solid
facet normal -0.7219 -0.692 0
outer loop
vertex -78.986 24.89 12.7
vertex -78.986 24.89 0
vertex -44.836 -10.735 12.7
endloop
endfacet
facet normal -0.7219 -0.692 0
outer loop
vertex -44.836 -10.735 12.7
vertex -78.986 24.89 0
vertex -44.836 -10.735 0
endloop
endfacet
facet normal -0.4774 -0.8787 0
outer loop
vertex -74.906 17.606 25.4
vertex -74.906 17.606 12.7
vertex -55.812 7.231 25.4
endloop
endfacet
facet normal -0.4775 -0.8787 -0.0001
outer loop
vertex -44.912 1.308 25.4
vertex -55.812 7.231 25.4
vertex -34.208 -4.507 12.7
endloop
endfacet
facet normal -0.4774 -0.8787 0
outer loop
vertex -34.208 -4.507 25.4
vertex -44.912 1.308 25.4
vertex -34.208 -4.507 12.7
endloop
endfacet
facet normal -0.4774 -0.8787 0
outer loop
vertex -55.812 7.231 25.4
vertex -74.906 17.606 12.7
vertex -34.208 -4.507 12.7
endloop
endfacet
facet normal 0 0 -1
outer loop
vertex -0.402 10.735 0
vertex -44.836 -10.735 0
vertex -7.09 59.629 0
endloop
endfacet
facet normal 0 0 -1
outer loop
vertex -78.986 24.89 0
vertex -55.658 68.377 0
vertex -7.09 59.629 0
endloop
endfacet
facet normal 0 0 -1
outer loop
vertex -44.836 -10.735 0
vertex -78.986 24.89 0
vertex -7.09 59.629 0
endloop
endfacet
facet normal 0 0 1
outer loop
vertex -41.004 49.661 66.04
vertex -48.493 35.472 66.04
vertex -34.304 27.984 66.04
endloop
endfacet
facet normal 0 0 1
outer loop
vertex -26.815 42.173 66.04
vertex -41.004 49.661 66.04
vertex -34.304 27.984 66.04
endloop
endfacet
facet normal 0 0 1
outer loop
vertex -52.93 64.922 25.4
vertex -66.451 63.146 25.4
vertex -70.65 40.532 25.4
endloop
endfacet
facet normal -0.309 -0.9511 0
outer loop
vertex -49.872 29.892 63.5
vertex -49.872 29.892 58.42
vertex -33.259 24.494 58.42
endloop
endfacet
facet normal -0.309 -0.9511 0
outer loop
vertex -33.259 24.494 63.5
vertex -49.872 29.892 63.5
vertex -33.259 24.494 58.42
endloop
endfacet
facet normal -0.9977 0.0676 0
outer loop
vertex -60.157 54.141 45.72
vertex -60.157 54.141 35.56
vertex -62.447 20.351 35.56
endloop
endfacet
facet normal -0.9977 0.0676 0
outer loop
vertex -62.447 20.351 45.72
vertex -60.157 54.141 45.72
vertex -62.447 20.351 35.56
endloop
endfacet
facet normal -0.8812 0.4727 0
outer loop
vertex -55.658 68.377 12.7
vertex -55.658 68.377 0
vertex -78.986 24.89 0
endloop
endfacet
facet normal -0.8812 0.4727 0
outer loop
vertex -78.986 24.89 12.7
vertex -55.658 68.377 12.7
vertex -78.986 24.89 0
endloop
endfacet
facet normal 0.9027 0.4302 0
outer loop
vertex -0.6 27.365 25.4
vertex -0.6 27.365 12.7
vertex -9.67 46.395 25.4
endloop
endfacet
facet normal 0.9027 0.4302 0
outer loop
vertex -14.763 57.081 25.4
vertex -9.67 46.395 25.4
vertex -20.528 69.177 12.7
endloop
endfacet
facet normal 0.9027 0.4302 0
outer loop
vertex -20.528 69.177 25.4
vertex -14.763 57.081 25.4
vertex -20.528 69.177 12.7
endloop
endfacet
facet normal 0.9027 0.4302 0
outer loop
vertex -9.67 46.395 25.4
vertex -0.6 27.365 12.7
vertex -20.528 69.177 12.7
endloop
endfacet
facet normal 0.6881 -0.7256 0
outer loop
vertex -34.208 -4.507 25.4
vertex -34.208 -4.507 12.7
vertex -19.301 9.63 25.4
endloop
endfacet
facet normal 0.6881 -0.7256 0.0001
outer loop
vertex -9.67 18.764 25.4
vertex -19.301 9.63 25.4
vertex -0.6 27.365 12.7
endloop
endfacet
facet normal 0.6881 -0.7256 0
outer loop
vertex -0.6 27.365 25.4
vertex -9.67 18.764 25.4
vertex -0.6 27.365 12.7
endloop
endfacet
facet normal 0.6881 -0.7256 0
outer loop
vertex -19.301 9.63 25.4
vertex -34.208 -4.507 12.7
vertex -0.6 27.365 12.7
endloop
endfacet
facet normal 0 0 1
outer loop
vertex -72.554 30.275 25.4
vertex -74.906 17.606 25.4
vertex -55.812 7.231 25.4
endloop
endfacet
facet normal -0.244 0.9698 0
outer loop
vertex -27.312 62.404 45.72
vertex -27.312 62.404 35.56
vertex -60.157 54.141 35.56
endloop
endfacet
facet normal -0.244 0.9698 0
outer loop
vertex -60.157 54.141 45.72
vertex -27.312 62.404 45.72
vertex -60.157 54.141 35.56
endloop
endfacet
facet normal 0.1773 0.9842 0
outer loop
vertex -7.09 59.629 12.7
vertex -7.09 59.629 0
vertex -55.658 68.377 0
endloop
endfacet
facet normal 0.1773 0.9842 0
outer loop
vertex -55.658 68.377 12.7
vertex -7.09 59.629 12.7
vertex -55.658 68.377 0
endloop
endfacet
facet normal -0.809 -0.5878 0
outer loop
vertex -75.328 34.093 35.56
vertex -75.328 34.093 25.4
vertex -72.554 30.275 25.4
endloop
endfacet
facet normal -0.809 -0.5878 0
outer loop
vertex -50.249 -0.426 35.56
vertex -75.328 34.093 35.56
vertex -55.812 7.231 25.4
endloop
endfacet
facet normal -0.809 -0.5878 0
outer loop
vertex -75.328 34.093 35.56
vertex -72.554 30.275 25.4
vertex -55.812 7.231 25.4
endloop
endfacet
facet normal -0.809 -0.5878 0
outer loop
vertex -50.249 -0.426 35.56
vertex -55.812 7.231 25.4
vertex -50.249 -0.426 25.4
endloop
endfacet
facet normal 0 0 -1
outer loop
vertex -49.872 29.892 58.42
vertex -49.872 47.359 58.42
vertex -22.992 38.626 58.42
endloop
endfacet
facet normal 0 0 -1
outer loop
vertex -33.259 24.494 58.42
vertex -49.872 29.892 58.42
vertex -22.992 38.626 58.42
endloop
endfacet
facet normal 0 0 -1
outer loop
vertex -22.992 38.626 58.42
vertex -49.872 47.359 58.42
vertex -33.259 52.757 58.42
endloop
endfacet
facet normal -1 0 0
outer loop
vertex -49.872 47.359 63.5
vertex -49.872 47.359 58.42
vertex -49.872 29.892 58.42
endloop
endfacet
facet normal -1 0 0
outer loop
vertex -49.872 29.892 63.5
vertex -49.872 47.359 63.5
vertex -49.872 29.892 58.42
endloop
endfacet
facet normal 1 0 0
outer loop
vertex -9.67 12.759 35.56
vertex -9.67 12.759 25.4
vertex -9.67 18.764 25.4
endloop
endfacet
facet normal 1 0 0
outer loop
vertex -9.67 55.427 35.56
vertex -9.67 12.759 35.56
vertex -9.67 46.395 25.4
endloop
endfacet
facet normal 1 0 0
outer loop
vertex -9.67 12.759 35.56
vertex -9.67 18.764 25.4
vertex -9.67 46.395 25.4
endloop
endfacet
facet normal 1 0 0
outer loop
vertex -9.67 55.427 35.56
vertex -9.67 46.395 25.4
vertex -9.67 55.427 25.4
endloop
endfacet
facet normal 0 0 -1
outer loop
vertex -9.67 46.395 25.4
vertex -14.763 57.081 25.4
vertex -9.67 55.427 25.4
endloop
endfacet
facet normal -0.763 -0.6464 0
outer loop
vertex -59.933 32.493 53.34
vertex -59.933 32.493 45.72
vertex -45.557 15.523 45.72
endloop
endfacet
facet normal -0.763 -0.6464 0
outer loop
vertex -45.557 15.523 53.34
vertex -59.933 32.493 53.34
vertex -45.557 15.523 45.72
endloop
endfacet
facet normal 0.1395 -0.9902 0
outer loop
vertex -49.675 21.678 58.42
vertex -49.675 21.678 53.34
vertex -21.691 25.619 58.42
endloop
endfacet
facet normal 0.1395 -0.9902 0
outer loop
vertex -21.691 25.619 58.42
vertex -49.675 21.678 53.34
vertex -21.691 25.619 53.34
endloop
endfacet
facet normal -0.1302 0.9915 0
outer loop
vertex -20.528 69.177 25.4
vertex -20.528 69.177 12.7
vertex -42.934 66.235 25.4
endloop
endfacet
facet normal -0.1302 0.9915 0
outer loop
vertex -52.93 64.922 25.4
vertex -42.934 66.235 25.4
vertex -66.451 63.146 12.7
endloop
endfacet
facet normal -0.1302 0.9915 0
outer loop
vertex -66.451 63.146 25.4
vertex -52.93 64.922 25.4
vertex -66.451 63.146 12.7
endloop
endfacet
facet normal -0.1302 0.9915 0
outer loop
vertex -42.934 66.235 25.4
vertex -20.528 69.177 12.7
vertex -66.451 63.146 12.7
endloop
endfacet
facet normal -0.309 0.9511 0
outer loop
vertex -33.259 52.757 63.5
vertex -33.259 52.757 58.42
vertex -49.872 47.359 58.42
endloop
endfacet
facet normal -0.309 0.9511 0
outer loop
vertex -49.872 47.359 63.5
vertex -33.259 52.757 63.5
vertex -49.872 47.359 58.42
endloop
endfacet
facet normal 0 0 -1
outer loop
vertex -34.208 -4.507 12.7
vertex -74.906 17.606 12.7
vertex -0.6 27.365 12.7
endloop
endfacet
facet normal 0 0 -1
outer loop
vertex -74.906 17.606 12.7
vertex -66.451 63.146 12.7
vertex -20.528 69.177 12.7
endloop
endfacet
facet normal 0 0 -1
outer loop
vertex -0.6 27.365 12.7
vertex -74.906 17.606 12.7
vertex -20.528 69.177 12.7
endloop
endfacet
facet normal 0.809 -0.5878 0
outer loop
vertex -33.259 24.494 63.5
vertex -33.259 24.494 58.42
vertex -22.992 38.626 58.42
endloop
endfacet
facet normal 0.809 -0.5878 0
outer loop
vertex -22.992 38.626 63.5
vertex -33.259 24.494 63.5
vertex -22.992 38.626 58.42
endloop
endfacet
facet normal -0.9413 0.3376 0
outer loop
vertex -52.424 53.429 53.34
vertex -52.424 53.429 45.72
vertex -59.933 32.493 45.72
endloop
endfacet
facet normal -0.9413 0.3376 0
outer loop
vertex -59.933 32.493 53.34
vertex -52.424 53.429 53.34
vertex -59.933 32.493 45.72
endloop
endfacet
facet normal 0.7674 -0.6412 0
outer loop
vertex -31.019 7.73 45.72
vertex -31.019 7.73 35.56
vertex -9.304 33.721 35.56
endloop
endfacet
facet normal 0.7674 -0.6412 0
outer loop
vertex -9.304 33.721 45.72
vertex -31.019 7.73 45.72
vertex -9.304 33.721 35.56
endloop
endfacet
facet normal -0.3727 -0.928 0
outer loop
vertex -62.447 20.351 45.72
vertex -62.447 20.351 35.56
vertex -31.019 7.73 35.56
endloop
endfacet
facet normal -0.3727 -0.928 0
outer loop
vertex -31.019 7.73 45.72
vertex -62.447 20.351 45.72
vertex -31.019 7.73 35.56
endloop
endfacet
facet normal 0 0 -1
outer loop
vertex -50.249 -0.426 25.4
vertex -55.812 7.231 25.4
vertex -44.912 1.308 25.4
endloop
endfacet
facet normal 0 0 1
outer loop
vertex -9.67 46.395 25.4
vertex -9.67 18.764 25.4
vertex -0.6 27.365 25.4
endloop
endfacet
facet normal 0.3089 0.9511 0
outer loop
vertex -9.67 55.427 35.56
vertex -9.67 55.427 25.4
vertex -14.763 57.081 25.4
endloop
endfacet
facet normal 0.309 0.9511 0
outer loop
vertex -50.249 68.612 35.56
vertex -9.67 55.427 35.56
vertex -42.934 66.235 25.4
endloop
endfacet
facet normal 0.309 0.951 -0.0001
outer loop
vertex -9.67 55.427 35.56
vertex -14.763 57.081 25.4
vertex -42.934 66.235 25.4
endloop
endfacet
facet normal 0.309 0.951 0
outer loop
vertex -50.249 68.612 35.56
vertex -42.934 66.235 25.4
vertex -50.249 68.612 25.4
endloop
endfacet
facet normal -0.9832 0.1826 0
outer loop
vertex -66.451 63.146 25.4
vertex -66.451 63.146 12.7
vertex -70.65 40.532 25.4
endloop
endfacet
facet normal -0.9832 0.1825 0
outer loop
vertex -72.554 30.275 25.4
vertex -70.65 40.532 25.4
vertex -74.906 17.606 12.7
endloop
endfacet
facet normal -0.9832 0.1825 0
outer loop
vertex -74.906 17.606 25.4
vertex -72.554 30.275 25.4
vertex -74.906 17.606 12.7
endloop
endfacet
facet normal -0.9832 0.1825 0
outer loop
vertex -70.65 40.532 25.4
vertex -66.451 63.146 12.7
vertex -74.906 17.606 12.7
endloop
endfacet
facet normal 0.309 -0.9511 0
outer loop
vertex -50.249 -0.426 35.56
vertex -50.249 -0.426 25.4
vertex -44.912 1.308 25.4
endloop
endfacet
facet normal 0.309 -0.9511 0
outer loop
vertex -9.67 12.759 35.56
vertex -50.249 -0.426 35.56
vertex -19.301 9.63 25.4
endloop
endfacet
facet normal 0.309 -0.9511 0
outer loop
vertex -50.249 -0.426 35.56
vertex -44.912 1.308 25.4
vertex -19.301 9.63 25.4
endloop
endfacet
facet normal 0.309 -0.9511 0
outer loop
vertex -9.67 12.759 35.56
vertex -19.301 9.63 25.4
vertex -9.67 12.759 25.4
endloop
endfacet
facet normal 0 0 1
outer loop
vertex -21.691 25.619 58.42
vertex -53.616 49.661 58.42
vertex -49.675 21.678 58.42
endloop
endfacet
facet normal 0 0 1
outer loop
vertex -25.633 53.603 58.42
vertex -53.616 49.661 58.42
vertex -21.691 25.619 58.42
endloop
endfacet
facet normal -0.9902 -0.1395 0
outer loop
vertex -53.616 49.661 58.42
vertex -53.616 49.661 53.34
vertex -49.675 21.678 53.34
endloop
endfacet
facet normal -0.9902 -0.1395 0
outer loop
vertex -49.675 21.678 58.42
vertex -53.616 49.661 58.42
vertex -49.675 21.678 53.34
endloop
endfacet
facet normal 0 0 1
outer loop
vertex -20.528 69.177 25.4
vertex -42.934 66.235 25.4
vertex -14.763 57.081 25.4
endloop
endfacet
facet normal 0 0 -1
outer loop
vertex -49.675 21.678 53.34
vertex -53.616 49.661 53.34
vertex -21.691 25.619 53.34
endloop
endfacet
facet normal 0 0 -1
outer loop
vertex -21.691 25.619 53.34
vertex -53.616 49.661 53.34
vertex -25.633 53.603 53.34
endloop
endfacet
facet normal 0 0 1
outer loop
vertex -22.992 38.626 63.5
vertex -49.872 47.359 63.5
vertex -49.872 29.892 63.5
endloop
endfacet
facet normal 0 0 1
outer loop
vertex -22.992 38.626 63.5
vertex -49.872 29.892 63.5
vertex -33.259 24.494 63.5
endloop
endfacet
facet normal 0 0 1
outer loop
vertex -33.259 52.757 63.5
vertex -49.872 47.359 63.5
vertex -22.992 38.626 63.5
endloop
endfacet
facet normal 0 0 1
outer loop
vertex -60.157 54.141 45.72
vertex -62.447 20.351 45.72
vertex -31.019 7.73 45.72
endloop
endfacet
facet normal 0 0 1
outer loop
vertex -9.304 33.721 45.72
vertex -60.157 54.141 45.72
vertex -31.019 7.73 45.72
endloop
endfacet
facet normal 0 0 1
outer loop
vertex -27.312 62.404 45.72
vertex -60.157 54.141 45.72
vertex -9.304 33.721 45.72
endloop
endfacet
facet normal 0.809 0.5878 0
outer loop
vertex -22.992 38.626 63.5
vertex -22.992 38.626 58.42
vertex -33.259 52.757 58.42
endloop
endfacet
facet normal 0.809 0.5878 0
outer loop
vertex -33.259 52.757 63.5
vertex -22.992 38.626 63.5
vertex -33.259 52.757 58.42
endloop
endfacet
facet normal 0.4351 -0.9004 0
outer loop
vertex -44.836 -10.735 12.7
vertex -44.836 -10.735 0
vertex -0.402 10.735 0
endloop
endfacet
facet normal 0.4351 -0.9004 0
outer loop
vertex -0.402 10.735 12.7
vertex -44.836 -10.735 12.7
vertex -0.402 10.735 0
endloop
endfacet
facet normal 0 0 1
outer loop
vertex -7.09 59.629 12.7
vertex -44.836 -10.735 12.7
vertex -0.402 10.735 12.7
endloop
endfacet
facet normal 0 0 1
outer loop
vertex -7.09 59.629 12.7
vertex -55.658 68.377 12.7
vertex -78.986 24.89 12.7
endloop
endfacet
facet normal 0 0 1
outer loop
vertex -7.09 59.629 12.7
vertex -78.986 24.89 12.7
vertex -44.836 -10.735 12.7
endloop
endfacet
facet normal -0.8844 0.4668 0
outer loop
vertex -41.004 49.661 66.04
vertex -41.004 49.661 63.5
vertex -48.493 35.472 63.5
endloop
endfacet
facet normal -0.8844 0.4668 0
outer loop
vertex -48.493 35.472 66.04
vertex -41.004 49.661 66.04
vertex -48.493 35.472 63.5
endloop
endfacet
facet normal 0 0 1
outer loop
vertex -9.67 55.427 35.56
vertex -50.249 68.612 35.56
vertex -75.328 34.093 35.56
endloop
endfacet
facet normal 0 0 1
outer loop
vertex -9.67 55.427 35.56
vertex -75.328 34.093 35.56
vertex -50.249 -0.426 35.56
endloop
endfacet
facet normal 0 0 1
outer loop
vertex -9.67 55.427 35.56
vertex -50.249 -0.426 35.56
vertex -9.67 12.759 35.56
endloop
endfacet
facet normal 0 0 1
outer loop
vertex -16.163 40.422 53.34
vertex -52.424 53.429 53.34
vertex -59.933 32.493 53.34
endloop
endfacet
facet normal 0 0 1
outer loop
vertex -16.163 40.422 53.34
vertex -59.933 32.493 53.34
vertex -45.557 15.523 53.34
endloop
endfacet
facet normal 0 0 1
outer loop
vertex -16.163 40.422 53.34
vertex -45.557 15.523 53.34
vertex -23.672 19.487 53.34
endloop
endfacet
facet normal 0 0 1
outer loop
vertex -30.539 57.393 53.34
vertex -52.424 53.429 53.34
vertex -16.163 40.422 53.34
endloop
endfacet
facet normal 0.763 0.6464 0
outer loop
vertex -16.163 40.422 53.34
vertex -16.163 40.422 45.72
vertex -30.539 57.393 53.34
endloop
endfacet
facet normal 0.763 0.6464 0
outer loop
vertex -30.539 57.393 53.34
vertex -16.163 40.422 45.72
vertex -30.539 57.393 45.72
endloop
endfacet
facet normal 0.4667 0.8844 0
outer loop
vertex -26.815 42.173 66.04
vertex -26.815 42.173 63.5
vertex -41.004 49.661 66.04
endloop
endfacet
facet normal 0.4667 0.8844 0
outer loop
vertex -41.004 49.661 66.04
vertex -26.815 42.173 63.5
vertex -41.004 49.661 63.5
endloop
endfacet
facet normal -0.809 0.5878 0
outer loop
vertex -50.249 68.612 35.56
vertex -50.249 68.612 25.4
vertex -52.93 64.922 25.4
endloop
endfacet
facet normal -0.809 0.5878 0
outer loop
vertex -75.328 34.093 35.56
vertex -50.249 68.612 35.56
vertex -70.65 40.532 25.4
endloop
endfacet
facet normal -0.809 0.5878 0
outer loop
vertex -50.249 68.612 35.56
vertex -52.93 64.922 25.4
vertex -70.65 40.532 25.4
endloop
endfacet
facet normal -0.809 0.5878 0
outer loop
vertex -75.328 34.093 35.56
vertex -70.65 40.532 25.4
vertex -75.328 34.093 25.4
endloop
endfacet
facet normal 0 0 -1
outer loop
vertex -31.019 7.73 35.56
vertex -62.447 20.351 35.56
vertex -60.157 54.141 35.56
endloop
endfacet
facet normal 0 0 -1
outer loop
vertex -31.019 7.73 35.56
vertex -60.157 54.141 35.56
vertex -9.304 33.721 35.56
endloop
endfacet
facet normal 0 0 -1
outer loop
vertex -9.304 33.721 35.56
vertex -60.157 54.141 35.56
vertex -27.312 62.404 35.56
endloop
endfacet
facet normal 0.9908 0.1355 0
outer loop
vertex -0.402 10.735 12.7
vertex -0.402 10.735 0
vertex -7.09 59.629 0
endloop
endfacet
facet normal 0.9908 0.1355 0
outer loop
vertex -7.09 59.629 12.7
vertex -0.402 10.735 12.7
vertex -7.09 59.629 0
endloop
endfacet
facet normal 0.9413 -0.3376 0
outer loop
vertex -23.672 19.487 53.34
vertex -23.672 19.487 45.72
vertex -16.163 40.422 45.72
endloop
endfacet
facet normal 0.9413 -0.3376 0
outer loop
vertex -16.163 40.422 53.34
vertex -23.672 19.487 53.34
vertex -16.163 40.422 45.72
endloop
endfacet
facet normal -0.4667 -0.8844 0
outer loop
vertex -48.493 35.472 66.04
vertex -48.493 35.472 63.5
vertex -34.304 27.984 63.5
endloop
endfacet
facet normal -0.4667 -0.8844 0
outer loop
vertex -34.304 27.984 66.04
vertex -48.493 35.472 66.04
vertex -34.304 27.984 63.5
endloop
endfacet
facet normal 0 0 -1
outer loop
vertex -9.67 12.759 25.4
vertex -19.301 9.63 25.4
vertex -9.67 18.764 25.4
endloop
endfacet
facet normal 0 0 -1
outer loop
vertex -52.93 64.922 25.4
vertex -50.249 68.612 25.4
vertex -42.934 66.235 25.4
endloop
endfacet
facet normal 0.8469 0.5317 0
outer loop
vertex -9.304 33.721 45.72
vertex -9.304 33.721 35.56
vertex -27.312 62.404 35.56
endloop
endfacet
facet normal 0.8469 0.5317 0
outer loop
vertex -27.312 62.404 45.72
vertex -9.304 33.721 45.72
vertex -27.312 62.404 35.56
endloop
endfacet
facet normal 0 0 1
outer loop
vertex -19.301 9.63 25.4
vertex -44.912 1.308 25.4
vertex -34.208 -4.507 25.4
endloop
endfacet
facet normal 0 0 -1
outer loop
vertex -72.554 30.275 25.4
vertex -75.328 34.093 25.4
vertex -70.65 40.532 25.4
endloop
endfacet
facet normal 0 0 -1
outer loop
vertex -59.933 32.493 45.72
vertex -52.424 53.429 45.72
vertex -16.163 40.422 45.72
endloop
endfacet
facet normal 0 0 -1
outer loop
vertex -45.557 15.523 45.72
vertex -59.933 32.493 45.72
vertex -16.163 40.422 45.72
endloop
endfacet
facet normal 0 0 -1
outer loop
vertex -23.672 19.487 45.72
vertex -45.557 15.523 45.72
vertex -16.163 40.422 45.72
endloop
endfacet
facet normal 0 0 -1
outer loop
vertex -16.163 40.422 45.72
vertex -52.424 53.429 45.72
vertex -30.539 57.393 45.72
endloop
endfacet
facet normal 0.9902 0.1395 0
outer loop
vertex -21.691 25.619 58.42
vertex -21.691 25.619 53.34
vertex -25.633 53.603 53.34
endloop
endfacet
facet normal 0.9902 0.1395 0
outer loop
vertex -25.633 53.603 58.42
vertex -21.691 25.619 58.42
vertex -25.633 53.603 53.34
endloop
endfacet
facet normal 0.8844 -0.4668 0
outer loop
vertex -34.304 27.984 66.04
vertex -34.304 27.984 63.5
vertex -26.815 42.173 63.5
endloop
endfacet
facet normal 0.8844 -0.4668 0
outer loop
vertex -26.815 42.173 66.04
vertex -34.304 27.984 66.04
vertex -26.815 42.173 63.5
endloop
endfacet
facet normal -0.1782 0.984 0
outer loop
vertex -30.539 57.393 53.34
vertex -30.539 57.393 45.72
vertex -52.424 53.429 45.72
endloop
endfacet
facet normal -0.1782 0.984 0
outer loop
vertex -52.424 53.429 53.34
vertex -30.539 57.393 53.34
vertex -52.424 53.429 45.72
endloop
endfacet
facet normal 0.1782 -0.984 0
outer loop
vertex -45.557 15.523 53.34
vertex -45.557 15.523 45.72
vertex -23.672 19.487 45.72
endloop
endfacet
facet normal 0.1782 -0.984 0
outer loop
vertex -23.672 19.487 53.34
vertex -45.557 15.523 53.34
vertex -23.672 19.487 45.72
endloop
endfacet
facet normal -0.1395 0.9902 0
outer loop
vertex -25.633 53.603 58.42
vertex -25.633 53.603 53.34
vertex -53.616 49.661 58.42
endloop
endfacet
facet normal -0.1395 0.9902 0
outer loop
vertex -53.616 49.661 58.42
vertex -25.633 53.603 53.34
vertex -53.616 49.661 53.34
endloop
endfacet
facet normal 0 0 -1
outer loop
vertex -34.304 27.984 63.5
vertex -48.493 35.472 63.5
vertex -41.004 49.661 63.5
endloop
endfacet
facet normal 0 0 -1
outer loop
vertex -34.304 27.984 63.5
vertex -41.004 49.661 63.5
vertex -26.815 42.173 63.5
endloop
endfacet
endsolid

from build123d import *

# Parameters (mm, degrees)
F1_DEPTH  = 12.7
F3_DEPTH  = 12.7
F5_DEPTH  = 10.16
F7_DEPTH  = 10.16
F9_DEPTH  = 7.62
F11_DEPTH = 5.08
F13_DEPTH = 5.08
F15_DEPTH = 2.54


with BuildPart() as f1:
    # F0 (on Top) → F1 (new body)
    with BuildSketch(Plane.XY):
        Polygon((-44.836005, -10.735053), (-0.401864, 10.735053), (-7.090244, 59.62906), (-55.658031, 68.377112), (-78.986194, 24.889698), align=None)
    extrude(amount=F1_DEPTH)


with BuildPart() as f3:
    # F2 (on face) → F3 (new body)
    with BuildSketch(Plane.XY.offset(12.7)):
        Polygon((-66.451321, 63.145851), (-74.906267, 17.606181), (-34.208189, -4.507483), (-0.600448, 27.365191), (-20.527799, 69.177251), align=None)
    extrude(amount=F3_DEPTH)

    # F4 (on face) → F5 (join)
    with BuildSketch(Plane.XY.offset(25.4)):
        Polygon((-9.669998, 12.759262), (-9.669998, 55.426596), (-50.249044, 68.611528), (-75.328274, 34.092929), (-50.249044, -0.425669), align=None)
    extrude(amount=F5_DEPTH)


with BuildPart() as f7:
    # F6 (on face) → F7 (new body)
    with BuildSketch(Plane.XY.offset(35.56)):
        Polygon((-60.156629, 54.141154), (-62.447496, 20.35092), (-31.01899, 7.730419), (-9.304238, 33.720755), (-27.312289, 62.404167), align=None)
    extrude(amount=F7_DEPTH)


with BuildPart() as f9:
    # F8 (on face) → F9 (new body)
    with BuildSketch(Plane.XY.offset(45.72)):
        Polygon((-52.423603, 53.428594), (-59.93294, 32.493476), (-45.557265, 15.522641), (-23.672253, 19.486923), (-16.162917, 40.422041), (-30.538591, 57.392876), align=None)
    extrude(amount=F9_DEPTH)


with BuildPart() as f11:
    # F10 (on face) → F11 (new body)
    with BuildSketch(Plane.XY.offset(53.34)):
        Polygon((-53.616375, 49.661379), (-49.674995, 21.677587), (-21.691203, 25.618967), (-25.632583, 53.602759), align=None)
    extrude(amount=F11_DEPTH)


with BuildPart() as f13:
    # F12 (on face) → F13 (new body)
    with BuildSketch(Plane.XY.offset(58.42)):
        Polygon((-49.872067, 47.359436), (-49.872067, 29.891596), (-33.259163, 24.493736), (-22.991824, 38.625516), (-33.259163, 52.757296), align=None)
    extrude(amount=F13_DEPTH)


with BuildPart() as f15:
    # F14 (on face) → F15 (new body)
    with BuildSketch(Plane.XY.offset(63.5)):
        Polygon((-41.003965, 49.661379), (-48.492581, 35.472412), (-34.303613, 27.983796), (-26.814997, 42.172763), align=None)
    extrude(amount=F15_DEPTH)


solid = Compound([f1.part, f3.part, f7.part, f9.part, f11.part, f13.part, f15.part])
